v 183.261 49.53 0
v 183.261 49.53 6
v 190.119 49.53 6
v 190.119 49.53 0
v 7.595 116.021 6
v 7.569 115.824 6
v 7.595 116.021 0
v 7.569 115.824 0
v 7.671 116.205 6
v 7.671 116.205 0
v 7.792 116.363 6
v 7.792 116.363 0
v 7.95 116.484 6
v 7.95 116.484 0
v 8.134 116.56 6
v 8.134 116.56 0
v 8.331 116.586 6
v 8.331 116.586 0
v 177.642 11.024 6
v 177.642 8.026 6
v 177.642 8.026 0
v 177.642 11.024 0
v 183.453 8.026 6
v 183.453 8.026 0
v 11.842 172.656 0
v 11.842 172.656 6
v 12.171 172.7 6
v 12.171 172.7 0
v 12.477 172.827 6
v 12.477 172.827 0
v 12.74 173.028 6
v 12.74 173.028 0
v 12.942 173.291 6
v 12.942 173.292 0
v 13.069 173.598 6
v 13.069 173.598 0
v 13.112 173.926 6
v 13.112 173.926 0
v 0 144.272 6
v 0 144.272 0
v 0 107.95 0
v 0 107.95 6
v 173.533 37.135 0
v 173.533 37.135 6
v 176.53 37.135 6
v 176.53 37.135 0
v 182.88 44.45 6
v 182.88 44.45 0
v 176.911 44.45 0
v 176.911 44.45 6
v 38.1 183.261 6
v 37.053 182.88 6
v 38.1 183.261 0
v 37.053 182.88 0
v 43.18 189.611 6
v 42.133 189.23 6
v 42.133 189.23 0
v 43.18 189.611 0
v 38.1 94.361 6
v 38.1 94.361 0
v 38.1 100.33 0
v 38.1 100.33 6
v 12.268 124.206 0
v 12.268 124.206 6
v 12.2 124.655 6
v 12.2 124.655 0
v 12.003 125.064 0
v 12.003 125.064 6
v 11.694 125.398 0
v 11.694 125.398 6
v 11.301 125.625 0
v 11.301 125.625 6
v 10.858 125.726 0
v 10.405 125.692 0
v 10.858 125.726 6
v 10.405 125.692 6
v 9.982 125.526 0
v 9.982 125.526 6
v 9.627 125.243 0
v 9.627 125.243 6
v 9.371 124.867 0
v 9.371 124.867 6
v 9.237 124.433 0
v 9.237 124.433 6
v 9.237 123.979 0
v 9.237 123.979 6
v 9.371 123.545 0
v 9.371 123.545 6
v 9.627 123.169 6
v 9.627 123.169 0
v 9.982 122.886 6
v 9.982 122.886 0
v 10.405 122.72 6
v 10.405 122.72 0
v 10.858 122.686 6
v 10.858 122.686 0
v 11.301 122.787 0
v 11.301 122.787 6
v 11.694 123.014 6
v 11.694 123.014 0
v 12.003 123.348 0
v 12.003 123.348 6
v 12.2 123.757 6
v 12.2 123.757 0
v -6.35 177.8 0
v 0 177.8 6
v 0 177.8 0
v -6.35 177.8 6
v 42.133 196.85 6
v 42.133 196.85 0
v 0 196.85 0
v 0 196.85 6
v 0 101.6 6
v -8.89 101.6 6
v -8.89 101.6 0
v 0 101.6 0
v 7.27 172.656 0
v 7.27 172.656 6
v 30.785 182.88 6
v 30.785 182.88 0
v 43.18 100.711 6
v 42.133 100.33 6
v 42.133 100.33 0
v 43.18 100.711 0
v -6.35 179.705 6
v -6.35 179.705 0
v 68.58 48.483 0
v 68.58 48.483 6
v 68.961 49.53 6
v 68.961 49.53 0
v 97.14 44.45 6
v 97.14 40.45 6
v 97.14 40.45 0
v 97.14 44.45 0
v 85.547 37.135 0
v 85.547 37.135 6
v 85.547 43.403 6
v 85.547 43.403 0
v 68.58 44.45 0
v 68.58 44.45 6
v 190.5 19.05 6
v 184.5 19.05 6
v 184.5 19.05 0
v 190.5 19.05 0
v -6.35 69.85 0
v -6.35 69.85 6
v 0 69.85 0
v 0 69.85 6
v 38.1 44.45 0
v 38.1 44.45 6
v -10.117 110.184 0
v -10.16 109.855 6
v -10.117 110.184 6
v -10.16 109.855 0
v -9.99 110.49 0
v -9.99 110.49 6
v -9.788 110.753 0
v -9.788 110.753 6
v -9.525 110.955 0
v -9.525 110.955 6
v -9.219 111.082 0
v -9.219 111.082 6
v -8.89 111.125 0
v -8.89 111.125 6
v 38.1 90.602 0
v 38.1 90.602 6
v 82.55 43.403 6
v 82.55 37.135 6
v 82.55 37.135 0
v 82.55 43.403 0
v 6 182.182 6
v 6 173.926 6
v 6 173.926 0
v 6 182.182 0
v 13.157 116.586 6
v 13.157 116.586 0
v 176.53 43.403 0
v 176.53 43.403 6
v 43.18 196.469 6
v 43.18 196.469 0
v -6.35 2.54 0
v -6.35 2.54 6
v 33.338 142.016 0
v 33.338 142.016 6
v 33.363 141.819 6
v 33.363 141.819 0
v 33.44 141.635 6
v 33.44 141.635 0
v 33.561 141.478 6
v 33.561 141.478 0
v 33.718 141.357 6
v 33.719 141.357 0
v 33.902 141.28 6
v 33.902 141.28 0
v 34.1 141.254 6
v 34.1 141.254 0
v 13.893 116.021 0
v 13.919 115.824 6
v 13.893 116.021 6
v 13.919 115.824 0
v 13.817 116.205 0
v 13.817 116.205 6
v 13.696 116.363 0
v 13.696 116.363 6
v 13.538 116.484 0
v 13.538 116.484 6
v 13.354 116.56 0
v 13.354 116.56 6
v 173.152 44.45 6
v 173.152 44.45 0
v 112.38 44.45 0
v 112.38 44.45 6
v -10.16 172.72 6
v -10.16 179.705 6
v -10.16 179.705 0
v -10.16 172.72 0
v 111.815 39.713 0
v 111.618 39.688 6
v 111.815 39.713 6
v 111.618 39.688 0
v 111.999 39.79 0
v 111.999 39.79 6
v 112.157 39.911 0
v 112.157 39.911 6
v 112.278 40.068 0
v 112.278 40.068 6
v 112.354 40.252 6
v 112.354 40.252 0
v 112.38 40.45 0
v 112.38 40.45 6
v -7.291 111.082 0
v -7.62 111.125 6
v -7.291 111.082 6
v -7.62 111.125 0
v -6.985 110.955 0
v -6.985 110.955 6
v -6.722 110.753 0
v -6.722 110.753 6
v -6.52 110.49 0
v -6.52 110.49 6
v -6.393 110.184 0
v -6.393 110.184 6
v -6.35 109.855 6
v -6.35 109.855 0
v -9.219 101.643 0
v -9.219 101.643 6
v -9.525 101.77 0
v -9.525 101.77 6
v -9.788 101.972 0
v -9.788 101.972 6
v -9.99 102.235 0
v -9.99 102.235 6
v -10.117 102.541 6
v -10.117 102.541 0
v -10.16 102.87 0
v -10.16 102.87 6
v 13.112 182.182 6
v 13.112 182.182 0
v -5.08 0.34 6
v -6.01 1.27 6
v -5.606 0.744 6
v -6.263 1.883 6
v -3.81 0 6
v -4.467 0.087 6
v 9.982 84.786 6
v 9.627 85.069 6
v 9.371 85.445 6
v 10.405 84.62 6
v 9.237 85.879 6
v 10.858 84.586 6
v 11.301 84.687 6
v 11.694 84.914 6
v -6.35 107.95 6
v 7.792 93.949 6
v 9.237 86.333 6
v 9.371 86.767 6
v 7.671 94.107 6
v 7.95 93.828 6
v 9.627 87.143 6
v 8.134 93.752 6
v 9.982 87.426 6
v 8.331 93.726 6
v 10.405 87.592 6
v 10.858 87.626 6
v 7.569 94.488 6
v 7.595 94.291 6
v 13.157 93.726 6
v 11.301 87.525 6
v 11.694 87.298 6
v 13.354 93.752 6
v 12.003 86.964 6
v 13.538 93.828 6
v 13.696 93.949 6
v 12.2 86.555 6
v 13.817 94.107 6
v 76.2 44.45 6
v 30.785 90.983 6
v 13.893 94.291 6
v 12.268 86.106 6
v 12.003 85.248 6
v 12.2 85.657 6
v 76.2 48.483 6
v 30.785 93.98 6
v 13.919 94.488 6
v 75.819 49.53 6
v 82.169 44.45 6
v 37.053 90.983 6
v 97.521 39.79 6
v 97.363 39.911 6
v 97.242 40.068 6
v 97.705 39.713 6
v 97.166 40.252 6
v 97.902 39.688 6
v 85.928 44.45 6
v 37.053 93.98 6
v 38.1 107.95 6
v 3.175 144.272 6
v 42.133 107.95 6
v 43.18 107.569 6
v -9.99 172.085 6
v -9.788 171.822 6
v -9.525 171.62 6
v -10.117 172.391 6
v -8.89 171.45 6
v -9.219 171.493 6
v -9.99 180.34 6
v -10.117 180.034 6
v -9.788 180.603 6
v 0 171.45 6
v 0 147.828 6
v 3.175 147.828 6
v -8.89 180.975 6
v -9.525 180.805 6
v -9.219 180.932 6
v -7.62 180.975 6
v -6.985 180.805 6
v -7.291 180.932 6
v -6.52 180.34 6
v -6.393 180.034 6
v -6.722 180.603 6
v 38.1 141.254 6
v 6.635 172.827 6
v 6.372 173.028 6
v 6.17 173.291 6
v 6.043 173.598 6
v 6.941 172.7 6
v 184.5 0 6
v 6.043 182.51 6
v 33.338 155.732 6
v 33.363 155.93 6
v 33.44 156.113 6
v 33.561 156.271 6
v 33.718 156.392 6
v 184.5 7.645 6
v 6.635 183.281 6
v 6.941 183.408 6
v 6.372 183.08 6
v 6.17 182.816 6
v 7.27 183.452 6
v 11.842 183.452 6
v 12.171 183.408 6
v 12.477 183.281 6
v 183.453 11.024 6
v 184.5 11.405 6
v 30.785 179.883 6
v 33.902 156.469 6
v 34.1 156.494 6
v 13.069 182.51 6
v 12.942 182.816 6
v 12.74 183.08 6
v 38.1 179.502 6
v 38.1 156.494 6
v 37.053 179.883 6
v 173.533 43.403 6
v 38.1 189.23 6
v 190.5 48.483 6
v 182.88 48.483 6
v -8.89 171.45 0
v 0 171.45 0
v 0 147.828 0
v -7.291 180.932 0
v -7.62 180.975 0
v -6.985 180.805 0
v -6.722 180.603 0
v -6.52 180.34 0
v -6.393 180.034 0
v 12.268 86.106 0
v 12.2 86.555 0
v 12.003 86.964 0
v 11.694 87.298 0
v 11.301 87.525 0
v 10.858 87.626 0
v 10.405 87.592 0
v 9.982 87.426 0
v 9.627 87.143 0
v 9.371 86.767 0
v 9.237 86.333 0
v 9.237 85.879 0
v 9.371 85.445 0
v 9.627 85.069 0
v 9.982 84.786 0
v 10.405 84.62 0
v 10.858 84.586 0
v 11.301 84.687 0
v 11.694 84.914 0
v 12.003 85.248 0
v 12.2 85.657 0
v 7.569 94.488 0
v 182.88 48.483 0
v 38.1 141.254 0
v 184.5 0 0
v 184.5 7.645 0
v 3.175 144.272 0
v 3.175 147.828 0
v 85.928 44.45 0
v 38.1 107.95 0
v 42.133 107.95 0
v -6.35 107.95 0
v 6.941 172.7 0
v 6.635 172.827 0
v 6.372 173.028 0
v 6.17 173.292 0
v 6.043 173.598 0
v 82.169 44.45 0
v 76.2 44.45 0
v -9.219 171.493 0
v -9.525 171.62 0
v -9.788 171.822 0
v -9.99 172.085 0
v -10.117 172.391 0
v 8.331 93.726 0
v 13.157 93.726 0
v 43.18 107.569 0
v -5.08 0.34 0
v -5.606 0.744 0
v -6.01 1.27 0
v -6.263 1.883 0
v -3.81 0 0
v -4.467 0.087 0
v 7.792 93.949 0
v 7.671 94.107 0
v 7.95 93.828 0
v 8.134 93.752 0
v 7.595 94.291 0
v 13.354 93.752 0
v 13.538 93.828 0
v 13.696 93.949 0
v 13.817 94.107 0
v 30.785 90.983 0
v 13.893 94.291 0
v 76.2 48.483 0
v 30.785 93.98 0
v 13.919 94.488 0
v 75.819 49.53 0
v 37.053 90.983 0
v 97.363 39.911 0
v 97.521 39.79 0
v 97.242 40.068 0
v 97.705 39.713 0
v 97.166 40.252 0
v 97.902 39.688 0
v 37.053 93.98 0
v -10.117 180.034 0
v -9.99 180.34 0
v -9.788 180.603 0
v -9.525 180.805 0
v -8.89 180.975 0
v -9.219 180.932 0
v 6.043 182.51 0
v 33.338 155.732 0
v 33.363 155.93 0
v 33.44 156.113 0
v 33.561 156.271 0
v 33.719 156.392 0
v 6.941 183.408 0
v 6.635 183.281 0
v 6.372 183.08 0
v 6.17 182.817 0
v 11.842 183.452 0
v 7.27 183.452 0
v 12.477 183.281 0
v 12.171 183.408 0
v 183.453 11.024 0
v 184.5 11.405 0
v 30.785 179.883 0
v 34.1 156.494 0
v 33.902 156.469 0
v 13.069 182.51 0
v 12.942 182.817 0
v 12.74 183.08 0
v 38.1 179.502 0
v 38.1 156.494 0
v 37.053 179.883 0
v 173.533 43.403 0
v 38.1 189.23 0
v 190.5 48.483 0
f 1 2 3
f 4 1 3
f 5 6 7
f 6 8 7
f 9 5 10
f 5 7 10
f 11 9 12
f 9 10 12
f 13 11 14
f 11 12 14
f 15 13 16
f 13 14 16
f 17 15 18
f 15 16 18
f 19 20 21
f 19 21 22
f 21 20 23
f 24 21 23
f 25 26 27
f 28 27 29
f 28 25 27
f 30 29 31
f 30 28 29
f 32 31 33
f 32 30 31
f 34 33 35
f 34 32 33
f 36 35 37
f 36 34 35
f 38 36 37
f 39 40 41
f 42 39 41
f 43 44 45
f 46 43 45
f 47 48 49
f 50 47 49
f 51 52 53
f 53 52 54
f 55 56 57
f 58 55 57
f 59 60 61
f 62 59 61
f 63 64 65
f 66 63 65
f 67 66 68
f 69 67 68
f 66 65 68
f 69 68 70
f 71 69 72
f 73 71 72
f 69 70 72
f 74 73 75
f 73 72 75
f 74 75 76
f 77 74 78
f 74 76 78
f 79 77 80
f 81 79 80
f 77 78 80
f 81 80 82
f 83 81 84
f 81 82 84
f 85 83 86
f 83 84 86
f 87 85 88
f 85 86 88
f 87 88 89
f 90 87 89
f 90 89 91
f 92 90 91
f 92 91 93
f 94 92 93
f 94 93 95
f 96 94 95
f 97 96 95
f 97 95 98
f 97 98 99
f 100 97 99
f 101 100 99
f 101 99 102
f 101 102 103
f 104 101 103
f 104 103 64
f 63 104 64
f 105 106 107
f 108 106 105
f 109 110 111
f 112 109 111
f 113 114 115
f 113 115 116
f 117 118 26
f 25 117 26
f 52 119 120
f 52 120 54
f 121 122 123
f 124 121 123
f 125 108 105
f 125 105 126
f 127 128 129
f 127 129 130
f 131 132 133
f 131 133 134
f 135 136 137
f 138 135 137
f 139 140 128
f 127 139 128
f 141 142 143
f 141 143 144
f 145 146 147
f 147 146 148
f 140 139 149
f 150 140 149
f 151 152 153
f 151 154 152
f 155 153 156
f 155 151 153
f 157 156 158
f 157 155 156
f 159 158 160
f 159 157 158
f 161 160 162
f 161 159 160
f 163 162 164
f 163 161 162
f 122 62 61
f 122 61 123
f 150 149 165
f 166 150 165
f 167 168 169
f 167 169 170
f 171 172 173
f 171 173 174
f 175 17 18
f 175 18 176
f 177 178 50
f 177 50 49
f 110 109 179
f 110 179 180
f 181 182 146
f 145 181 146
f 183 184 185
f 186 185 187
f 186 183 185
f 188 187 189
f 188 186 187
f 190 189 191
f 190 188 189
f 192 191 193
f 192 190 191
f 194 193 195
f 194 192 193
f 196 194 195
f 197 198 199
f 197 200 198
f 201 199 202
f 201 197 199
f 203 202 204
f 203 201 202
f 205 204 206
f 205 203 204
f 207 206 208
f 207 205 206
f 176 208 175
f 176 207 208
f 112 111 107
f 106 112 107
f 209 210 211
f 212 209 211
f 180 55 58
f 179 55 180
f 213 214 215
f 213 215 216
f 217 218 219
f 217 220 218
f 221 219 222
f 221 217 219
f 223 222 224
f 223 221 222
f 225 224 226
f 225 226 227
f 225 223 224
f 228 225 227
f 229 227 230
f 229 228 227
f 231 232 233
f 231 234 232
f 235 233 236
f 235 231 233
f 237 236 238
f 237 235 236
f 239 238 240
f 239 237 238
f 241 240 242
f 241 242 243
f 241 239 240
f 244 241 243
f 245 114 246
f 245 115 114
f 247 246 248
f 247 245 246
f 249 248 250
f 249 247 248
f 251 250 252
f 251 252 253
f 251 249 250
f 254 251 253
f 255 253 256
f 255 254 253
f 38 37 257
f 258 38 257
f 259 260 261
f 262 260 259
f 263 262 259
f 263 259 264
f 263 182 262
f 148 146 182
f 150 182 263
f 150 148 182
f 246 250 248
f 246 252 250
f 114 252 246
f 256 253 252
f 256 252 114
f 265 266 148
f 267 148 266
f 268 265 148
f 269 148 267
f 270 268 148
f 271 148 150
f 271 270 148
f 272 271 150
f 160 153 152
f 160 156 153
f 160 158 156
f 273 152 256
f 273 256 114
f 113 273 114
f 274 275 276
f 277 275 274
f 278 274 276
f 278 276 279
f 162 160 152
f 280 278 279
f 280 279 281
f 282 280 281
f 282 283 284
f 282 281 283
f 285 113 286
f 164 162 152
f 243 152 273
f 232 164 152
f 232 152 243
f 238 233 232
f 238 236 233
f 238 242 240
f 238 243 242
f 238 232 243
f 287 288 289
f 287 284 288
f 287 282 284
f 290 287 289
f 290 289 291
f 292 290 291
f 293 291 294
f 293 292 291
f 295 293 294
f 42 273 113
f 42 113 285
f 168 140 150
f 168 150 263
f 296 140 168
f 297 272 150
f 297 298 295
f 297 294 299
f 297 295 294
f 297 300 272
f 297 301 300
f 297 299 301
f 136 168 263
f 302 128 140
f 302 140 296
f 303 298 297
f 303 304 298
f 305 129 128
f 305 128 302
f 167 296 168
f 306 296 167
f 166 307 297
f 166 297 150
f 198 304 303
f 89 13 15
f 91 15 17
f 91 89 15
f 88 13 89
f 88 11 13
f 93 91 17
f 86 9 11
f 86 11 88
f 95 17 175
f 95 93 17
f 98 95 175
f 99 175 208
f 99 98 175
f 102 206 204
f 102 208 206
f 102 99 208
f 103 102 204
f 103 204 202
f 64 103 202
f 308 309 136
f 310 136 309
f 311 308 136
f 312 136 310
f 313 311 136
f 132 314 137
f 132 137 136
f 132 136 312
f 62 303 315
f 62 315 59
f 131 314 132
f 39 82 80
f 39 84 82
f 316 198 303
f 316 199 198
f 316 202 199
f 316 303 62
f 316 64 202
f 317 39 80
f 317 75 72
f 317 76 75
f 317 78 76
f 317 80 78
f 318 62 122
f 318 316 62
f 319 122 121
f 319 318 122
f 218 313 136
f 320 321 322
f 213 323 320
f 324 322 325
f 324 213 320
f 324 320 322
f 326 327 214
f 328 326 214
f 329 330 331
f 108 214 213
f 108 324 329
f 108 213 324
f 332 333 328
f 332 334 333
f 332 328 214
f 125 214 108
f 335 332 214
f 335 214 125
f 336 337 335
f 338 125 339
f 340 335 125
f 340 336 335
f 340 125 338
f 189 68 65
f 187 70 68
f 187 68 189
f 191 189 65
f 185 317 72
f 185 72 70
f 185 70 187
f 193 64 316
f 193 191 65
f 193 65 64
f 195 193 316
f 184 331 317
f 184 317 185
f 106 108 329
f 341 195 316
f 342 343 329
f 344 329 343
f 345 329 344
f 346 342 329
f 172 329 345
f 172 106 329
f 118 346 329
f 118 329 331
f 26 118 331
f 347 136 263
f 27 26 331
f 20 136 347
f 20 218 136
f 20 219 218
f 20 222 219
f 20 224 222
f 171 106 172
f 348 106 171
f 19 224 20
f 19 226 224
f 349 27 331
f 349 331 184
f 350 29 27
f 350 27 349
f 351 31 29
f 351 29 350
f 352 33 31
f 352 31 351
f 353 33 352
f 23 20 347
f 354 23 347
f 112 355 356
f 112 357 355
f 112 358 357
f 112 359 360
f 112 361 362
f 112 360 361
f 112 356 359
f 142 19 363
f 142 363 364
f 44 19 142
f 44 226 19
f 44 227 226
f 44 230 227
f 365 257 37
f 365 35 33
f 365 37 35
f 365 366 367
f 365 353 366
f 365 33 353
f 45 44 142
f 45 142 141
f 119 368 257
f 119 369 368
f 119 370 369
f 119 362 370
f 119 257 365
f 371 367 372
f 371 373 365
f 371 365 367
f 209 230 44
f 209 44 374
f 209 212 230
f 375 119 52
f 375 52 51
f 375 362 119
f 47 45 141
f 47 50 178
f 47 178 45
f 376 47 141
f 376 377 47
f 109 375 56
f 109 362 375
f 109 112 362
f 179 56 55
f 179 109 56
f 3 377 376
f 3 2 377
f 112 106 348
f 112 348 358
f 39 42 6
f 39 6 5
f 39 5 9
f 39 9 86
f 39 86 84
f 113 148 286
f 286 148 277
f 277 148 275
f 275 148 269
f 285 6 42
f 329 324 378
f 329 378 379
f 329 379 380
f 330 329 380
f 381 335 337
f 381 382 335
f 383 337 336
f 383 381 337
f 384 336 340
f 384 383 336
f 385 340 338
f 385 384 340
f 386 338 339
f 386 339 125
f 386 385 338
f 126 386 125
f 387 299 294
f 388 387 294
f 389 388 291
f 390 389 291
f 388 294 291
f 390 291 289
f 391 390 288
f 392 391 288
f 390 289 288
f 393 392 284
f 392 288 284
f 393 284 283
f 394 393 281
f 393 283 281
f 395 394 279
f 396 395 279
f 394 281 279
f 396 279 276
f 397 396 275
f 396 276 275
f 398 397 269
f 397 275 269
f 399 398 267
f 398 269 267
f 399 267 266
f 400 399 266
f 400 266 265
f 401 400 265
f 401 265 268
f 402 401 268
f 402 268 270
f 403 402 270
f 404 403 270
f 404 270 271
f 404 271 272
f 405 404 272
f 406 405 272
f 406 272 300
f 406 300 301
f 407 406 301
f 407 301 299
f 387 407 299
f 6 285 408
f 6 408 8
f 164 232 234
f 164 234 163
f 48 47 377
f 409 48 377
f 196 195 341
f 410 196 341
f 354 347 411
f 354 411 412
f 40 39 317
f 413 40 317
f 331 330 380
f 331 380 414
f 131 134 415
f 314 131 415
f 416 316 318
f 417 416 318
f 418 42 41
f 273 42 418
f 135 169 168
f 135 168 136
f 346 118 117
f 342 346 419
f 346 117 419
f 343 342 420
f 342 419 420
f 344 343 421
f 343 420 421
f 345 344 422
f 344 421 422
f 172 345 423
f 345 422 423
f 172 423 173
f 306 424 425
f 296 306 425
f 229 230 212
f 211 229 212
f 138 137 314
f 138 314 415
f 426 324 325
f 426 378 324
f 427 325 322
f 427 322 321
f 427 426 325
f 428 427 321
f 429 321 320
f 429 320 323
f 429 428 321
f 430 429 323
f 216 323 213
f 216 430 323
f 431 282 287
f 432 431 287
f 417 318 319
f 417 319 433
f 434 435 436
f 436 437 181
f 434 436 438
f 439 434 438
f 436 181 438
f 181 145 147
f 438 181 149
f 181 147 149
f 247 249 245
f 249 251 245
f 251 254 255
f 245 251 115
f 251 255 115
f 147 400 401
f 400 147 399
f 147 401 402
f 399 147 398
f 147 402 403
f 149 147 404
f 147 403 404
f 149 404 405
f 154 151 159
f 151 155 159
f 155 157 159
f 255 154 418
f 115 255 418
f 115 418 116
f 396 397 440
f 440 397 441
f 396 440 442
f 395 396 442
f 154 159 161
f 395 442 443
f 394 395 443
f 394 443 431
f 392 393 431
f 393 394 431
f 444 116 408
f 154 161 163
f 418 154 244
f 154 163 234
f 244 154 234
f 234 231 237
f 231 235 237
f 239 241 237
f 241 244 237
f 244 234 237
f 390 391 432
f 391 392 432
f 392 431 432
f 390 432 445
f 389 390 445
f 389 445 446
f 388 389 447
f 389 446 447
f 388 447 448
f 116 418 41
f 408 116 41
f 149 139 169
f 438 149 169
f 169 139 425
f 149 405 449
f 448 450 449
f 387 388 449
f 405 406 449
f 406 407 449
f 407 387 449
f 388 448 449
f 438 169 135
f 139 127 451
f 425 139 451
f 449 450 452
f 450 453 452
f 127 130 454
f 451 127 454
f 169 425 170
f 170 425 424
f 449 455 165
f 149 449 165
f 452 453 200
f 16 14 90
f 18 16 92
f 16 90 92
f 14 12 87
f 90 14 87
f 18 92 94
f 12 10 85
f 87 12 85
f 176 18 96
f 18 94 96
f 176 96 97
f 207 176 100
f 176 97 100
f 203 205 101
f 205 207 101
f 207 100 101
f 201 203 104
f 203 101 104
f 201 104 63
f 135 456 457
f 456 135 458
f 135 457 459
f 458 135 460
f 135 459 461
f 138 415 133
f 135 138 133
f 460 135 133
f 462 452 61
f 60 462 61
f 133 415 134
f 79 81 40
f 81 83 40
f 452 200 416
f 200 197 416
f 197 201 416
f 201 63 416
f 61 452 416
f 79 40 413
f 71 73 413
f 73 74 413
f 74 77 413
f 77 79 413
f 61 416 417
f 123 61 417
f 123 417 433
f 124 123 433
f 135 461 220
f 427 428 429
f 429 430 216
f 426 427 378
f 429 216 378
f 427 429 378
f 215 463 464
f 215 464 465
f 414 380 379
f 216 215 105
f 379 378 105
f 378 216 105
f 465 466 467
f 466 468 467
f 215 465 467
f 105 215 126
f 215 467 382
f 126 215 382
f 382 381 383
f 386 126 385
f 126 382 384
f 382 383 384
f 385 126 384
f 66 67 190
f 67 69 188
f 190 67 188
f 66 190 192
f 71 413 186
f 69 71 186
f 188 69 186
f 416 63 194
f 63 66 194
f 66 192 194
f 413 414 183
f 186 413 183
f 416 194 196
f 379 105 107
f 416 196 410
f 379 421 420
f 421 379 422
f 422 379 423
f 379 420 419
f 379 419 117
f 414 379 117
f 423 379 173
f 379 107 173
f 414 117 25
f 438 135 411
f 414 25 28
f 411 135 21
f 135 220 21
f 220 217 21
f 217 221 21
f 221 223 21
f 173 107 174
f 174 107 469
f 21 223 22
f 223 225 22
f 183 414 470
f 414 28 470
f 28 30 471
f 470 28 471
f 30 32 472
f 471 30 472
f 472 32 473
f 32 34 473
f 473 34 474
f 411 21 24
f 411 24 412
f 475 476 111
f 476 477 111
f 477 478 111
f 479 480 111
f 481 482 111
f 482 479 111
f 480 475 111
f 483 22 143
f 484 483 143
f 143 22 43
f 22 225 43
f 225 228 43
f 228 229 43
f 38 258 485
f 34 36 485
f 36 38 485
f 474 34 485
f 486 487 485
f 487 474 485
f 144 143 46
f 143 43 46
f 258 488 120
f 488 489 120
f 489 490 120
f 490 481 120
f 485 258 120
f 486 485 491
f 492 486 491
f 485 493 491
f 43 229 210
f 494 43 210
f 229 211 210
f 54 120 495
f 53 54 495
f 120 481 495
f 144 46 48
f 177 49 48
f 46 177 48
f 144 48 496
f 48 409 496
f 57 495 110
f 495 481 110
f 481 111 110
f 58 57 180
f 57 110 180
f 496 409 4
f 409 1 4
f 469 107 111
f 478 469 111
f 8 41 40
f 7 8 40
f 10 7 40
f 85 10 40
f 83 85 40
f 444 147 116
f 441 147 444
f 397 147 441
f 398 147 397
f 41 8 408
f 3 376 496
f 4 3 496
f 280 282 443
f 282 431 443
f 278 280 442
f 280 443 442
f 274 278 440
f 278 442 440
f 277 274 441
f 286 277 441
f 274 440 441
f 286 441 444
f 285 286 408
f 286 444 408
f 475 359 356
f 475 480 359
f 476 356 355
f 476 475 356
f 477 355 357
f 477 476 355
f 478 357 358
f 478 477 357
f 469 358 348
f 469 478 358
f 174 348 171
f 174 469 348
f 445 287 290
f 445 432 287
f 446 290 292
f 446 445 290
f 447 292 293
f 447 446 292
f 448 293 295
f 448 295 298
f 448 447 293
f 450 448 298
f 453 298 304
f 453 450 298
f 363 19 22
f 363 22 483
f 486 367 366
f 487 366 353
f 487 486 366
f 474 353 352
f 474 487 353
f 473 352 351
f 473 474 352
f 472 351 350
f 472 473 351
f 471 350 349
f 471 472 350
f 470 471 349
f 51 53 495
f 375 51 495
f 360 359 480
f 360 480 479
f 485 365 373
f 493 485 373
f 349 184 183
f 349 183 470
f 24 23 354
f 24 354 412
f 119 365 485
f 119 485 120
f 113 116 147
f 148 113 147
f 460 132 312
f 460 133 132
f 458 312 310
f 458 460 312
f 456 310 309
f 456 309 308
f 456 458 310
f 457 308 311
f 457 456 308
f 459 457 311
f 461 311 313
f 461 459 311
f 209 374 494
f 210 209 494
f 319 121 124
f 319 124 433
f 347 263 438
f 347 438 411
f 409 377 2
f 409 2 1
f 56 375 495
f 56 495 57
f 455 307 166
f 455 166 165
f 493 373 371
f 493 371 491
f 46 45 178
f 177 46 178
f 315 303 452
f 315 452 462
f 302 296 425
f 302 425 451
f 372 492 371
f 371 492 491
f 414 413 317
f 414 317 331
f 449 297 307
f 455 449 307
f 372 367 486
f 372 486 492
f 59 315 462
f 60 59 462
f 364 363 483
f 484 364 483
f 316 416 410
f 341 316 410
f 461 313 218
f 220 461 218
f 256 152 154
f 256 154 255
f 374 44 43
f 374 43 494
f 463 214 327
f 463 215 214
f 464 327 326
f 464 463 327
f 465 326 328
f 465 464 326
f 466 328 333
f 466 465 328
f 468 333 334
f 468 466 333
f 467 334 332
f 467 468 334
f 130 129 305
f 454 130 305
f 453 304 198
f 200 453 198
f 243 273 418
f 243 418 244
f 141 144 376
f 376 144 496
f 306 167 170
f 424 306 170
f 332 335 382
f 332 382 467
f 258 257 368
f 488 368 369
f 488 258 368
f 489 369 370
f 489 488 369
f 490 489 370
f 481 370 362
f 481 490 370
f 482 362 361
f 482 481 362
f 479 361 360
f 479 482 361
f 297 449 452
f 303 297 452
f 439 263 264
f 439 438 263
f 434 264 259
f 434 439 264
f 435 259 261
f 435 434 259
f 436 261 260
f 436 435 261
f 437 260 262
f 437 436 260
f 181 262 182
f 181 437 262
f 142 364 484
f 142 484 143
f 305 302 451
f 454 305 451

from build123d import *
from OCP.BRepFilletAPI import BRepFilletAPI_MakeChamfer

# Parameters (mm, degrees)
BOSS_EXTRUDE1_DEPTH = 6
SKETCH2_W           = 6.35
SKETCH2_H           = 69.85
SKETCH2_W_2         = 7.62
SKETCH2_H_2         = 5.08
SKETCH2_W_3         = 5.08
SKETCH2_H_3         = 7.62
BOSS_EXTRUDE2_DEPTH = 6
FILLET1_R           = 1.27
SKETCH3_W           = 6
SKETCH3_H           = 19.05
CUT_EXTRUDE1_DEPTH  = 275.000314781
FILLET2_R           = 2.54
SKETCH4_W           = 7.112
SKETCH4_H           = 10.795
SKETCH4_W_2         = 3.175
SKETCH4_H_2         = 3.556
CUT_EXTRUDE2_DEPTH  = 275.000314781
FILLET3_R           = 1.27
SKETCH5_R           = 1.524
SKETCH5_W           = 6.35
SKETCH5_H           = 22.86
CUT_EXTRUDE3_DEPTH  = 275.000314781
SKETCH6_W           = 7.3152
SKETCH6_H           = 2.9972
SKETCH6_W_2         = 2.9972
SKETCH6_H_2         = 7.3152
SKETCH6_W_3         = 6.858
SKETCH6_W_4         = 4.7625
SKETCH6_H_3         = 15.24
SKETCH6_W_5         = 15.24
SKETCH6_H_4         = 4.7625
CUT_EXTRUDE4_DEPTH  = 275.000314781
FILLET4_R           = 0.762
CHAMFER1_SIZE       = 0.381
CHAMFER1_SIZE2      = 1.046788897
CHAMFER2_SIZE       = 0.381
CHAMFER2_SIZE2      = 1.046788897


with BuildPart() as part:
    # Sketch1 → Boss-Extrude1 (new body)
    with BuildSketch(Plane.XY):
        Polygon((0, 0), (190.5, 0), (190.5, 44.45), (38.1, 44.45), (38.1, 196.85), (0, 196.85), align=None)
    extrude(amount=BOSS_EXTRUDE1_DEPTH)

    # Sketch2 → Boss-Extrude2 (add)
    with BuildSketch(Plane.XY.offset(6)):
        Polygon((0, 177.8), (-6.35, 177.8), (-6.35, 180.975), (-10.16, 180.975), (-10.16, 171.45), (0, 171.45), align=None)
        with Locations((-3.175, 34.925)):
            Rectangle(SKETCH2_W, SKETCH2_H)
        Polygon((0, 107.95), (-6.35, 107.95), (-6.35, 111.125), (-10.16, 111.125), (-10.16, 101.6), (0, 101.6), align=None)
        with Locations((72.39, 46.99)):
            Rectangle(SKETCH2_W_2, SKETCH2_H_2)
        with Locations((186.69, 46.99)):
            Rectangle(SKETCH2_W_2, SKETCH2_H_2)
        with Locations((40.64, 193.04)):
            Rectangle(SKETCH2_W_3, SKETCH2_H_3)
        with Locations((40.64, 104.14)):
            Rectangle(SKETCH2_W_3, SKETCH2_H_3)
    extrude(amount=-BOSS_EXTRUDE2_DEPTH)

    # Fillet1
    fillet1_edges = [part.edges().sort_by_distance(p)[0] for p in [
        (-10.16, 171.45, 3),
        (-10.16, 180.975, 3),
        (-6.35, 180.975, 3),
        (-10.16, 101.6, 3),
        (-10.16, 111.125, 3),
        (-6.35, 111.125, 3),
    ]]
    fillet(fillet1_edges, radius=FILLET1_R)

    # Sketch3 → Cut-Extrude1 (cut, through all)
    with BuildSketch(Plane.XY.offset(6)):
        with Locations((187.5, 9.525)):
            Rectangle(SKETCH3_W, SKETCH3_H)
    extrude(amount=-CUT_EXTRUDE1_DEPTH, mode=Mode.SUBTRACT)

    # Fillet2
    fillet2_edges = [part.edges().sort_by_distance(p)[0] for p in [
        (-6.35, 0, 3),
    ]]
    fillet(fillet2_edges, radius=FILLET2_R)

    # Sketch4 → Cut-Extrude2 (cut, through all)
    with BuildSketch(Plane.XY.offset(6)):
        with Locations((9.556, 178.054)):
            Rectangle(SKETCH4_W, SKETCH4_H)
        with Locations((1.5875, 146.05)):
            Rectangle(SKETCH4_W_2, SKETCH4_H_2)
    extrude(amount=-CUT_EXTRUDE2_DEPTH, mode=Mode.SUBTRACT)

    # Fillet3
    fillet3_edges = [part.edges().sort_by_distance(p)[0] for p in [
        (13.112, 183.4515, 3),
        (13.112, 172.6565, 3),
        (6, 172.6565, 3),
        (6, 183.4515, 3),
    ]]
    fillet(fillet3_edges, radius=FILLET3_R)

    # Sketch5 → Cut-Extrude3 (cut, through all)
    with BuildSketch(Plane.XY.offset(6)):
        with Locations((10.7442, 124.206)):
            Circle(SKETCH5_R)
        with Locations((10.7442, 86.106)):
            Circle(SKETCH5_R)
        with Locations((10.7442, 105.156)):
            Rectangle(SKETCH5_W, SKETCH5_H)
    extrude(amount=-CUT_EXTRUDE3_DEPTH, mode=Mode.SUBTRACT)

    # Sketch6 → Cut-Extrude4 (cut, through all)
    with BuildSketch(Plane.XY.offset(6)):
        with Locations((34.4424, 181.3814)):
            Rectangle(SKETCH6_W, SKETCH6_H)
        with Locations((34.4424, 92.4814)):
            Rectangle(SKETCH6_W, SKETCH6_H)
        with Locations((84.0486, 40.7924)):
            Rectangle(SKETCH6_W_2, SKETCH6_H_2)
        with Locations((175.0314, 40.7924)):
            Rectangle(SKETCH6_W_2, SKETCH6_H_2)
        with Locations((181.071, 9.525)):
            Rectangle(SKETCH6_W_3, SKETCH6_H)
        with Locations((35.71875, 148.87448)):
            Rectangle(SKETCH6_W_4, SKETCH6_H_3)
        with Locations((104.75976, 42.06875)):
            Rectangle(SKETCH6_W_5, SKETCH6_H_4)
    extrude(amount=-CUT_EXTRUDE4_DEPTH, mode=Mode.SUBTRACT)

    # Fillet4
    fillet4_edges = [part.edges().sort_by_distance(p)[0] for p in [
        (7.5692, 93.726, 3),
        (7.5692, 116.586, 3),
        (13.9192, 116.586, 3),
        (13.9192, 93.726, 3),
        (33.3375, 141.25448, 3),
        (33.3375, 156.49448, 3),
        (97.13976, 39.6875, 3),
        (112.37976, 39.6875, 3),
    ]]
    fillet(fillet4_edges, radius=FILLET4_R)

    # Chamfer1: one chamfer whose edges measure the first distance from different faces: ONE call of the kernel's chamfer builder (chamfer() names one face for all edges)
    chamfer1_edges_1 = [part.edges().sort_by_distance(p)[0] for p in [
        (38.1, 182.88, 3),
    ]]
    chamfer1_side_1 = [part.faces().sort_by_distance(p)[0] for p in [
        (38.1, 186.055, 3),
    ]]
    chamfer1_edges_2 = [part.edges().sort_by_distance(p)[0] for p in [
        (38.1, 179.8828, 3),
    ]]
    chamfer1_side_2 = [part.faces().sort_by_distance(p)[0] for p in [
        (38.1, 168.18864, 3),
    ]]
    chamfer1_edges_3 = [part.edges().sort_by_distance(p)[0] for p in [
        (38.1, 93.98, 3),
    ]]
    chamfer1_side_3 = [part.faces().sort_by_distance(p)[0] for p in [
        (38.1, 97.155, 3),
    ]]
    chamfer1_edges_4 = [part.edges().sort_by_distance(p)[0] for p in [
        (38.1, 90.9828, 3),
    ]]
    chamfer1_side_4 = [part.faces().sort_by_distance(p)[0] for p in [
        (38.1, 67.7164, 3),
    ]]
    chamfer1_edges_5 = [part.edges().sort_by_distance(p)[0] for p in [
        (82.55, 44.45, 3),
    ]]
    chamfer1_side_5 = [part.faces().sort_by_distance(p)[0] for p in [
        (79.375, 44.45, 3),
    ]]
    chamfer1_edges_6 = [part.edges().sort_by_distance(p)[0] for p in [
        (85.5472, 44.45, 3),
    ]]
    chamfer1_side_6 = [part.faces().sort_by_distance(p)[0] for p in [
        (91.34348, 44.45, 3),
    ]]
    chamfer1_edges_7 = [part.edges().sort_by_distance(p)[0] for p in [
        (173.5328, 44.45, 3),
    ]]
    chamfer1_side_7 = [part.faces().sort_by_distance(p)[0] for p in [
        (142.95628, 44.45, 3),
    ]]
    chamfer1_edges_8 = [part.edges().sort_by_distance(p)[0] for p in [
        (176.53, 44.45, 3),
    ]]
    chamfer1_side_8 = [part.faces().sort_by_distance(p)[0] for p in [
        (179.705, 44.45, 3),
    ]]
    chamfer1_edges_9 = [part.edges().sort_by_distance(p)[0] for p in [
        (184.5, 11.0236, 3),
    ]]
    chamfer1_side_9 = [part.faces().sort_by_distance(p)[0] for p in [
        (184.5, 15.0368, 3),
    ]]
    chamfer1_edges_10 = [part.edges().sort_by_distance(p)[0] for p in [
        (184.5, 8.0264, 3),
    ]]
    chamfer1_side_10 = [part.faces().sort_by_distance(p)[0] for p in [
        (184.5, 4.0132, 3),
    ]]
    chamfer1 = BRepFilletAPI_MakeChamfer(part.part.solid().wrapped)
    for e in chamfer1_edges_1:
        chamfer1.Add(CHAMFER1_SIZE, CHAMFER1_SIZE2, e.wrapped, chamfer1_side_1[0].wrapped)  # the first distance lies on this face
    for e in chamfer1_edges_2:
        chamfer1.Add(CHAMFER1_SIZE, CHAMFER1_SIZE2, e.wrapped, chamfer1_side_2[0].wrapped)  # the first distance lies on this face
    for e in chamfer1_edges_3:
        chamfer1.Add(CHAMFER1_SIZE, CHAMFER1_SIZE2, e.wrapped, chamfer1_side_3[0].wrapped)  # the first distance lies on this face
    for e in chamfer1_edges_4:
        chamfer1.Add(CHAMFER1_SIZE, CHAMFER1_SIZE2, e.wrapped, chamfer1_side_4[0].wrapped)  # the first distance lies on this face
    for e in chamfer1_edges_5:
        chamfer1.Add(CHAMFER1_SIZE, CHAMFER1_SIZE2, e.wrapped, chamfer1_side_5[0].wrapped)  # the first distance lies on this face
    for e in chamfer1_edges_6:
        chamfer1.Add(CHAMFER1_SIZE, CHAMFER1_SIZE2, e.wrapped, chamfer1_side_6[0].wrapped)  # the first distance lies on this face
    for e in chamfer1_edges_7:
        chamfer1.Add(CHAMFER1_SIZE, CHAMFER1_SIZE2, e.wrapped, chamfer1_side_7[0].wrapped)  # the first distance lies on this face
    for e in chamfer1_edges_8:
        chamfer1.Add(CHAMFER1_SIZE, CHAMFER1_SIZE2, e.wrapped, chamfer1_side_8[0].wrapped)  # the first distance lies on this face
    for e in chamfer1_edges_9:
        chamfer1.Add(CHAMFER1_SIZE, CHAMFER1_SIZE2, e.wrapped, chamfer1_side_9[0].wrapped)  # the first distance lies on this face
    for e in chamfer1_edges_10:
        chamfer1.Add(CHAMFER1_SIZE, CHAMFER1_SIZE2, e.wrapped, chamfer1_side_10[0].wrapped)  # the first distance lies on this face
    add(Compound.cast(chamfer1.Shape()), mode=Mode.REPLACE)

    # Chamfer2: one chamfer whose edges measure the first distance from different faces: ONE call of the kernel's chamfer builder (chamfer() names one face for all edges)
    chamfer2_edges_1 = [part.edges().sort_by_distance(p)[0] for p in [
        (68.58, 49.53, 3),
        (76.2, 49.53, 3),
    ]]
    chamfer2_side_1 = [part.faces().sort_by_distance(p)[0] for p in [
        (72.39, 49.53, 3),
    ]]
    chamfer2_edges_2 = [part.edges().sort_by_distance(p)[0] for p in [
        (190.5, 49.53, 3),
        (182.88, 49.53, 3),
    ]]
    chamfer2_side_2 = [part.faces().sort_by_distance(p)[0] for p in [
        (186.69, 49.53, 3),
    ]]
    chamfer2_edges_3 = [part.edges().sort_by_distance(p)[0] for p in [
        (43.18, 196.85, 3),
        (43.18, 189.23, 3),
    ]]
    chamfer2_side_3 = [part.faces().sort_by_distance(p)[0] for p in [
        (43.18, 193.04, 3),
    ]]
    chamfer2_edges_4 = [part.edges().sort_by_distance(p)[0] for p in [
        (43.18, 107.95, 3),
        (43.18, 100.33, 3),
    ]]
    chamfer2_side_4 = [part.faces().sort_by_distance(p)[0] for p in [
        (43.18, 104.14, 3),
    ]]
    chamfer2 = BRepFilletAPI_MakeChamfer(part.part.solid().wrapped)
    for e in chamfer2_edges_1:
        chamfer2.Add(CHAMFER2_SIZE, CHAMFER2_SIZE2, e.wrapped, chamfer2_side_1[0].wrapped)  # the first distance lies on this face
    for e in chamfer2_edges_2:
        chamfer2.Add(CHAMFER2_SIZE, CHAMFER2_SIZE2, e.wrapped, chamfer2_side_2[0].wrapped)  # the first distance lies on this face
    for e in chamfer2_edges_3:
        chamfer2.Add(CHAMFER2_SIZE, CHAMFER2_SIZE2, e.wrapped, chamfer2_side_3[0].wrapped)  # the first distance lies on this face
    for e in chamfer2_edges_4:
        chamfer2.Add(CHAMFER2_SIZE, CHAMFER2_SIZE2, e.wrapped, chamfer2_side_4[0].wrapped)  # the first distance lies on this face
    add(Compound.cast(chamfer2.Shape()), mode=Mode.REPLACE)


solid = part.part
